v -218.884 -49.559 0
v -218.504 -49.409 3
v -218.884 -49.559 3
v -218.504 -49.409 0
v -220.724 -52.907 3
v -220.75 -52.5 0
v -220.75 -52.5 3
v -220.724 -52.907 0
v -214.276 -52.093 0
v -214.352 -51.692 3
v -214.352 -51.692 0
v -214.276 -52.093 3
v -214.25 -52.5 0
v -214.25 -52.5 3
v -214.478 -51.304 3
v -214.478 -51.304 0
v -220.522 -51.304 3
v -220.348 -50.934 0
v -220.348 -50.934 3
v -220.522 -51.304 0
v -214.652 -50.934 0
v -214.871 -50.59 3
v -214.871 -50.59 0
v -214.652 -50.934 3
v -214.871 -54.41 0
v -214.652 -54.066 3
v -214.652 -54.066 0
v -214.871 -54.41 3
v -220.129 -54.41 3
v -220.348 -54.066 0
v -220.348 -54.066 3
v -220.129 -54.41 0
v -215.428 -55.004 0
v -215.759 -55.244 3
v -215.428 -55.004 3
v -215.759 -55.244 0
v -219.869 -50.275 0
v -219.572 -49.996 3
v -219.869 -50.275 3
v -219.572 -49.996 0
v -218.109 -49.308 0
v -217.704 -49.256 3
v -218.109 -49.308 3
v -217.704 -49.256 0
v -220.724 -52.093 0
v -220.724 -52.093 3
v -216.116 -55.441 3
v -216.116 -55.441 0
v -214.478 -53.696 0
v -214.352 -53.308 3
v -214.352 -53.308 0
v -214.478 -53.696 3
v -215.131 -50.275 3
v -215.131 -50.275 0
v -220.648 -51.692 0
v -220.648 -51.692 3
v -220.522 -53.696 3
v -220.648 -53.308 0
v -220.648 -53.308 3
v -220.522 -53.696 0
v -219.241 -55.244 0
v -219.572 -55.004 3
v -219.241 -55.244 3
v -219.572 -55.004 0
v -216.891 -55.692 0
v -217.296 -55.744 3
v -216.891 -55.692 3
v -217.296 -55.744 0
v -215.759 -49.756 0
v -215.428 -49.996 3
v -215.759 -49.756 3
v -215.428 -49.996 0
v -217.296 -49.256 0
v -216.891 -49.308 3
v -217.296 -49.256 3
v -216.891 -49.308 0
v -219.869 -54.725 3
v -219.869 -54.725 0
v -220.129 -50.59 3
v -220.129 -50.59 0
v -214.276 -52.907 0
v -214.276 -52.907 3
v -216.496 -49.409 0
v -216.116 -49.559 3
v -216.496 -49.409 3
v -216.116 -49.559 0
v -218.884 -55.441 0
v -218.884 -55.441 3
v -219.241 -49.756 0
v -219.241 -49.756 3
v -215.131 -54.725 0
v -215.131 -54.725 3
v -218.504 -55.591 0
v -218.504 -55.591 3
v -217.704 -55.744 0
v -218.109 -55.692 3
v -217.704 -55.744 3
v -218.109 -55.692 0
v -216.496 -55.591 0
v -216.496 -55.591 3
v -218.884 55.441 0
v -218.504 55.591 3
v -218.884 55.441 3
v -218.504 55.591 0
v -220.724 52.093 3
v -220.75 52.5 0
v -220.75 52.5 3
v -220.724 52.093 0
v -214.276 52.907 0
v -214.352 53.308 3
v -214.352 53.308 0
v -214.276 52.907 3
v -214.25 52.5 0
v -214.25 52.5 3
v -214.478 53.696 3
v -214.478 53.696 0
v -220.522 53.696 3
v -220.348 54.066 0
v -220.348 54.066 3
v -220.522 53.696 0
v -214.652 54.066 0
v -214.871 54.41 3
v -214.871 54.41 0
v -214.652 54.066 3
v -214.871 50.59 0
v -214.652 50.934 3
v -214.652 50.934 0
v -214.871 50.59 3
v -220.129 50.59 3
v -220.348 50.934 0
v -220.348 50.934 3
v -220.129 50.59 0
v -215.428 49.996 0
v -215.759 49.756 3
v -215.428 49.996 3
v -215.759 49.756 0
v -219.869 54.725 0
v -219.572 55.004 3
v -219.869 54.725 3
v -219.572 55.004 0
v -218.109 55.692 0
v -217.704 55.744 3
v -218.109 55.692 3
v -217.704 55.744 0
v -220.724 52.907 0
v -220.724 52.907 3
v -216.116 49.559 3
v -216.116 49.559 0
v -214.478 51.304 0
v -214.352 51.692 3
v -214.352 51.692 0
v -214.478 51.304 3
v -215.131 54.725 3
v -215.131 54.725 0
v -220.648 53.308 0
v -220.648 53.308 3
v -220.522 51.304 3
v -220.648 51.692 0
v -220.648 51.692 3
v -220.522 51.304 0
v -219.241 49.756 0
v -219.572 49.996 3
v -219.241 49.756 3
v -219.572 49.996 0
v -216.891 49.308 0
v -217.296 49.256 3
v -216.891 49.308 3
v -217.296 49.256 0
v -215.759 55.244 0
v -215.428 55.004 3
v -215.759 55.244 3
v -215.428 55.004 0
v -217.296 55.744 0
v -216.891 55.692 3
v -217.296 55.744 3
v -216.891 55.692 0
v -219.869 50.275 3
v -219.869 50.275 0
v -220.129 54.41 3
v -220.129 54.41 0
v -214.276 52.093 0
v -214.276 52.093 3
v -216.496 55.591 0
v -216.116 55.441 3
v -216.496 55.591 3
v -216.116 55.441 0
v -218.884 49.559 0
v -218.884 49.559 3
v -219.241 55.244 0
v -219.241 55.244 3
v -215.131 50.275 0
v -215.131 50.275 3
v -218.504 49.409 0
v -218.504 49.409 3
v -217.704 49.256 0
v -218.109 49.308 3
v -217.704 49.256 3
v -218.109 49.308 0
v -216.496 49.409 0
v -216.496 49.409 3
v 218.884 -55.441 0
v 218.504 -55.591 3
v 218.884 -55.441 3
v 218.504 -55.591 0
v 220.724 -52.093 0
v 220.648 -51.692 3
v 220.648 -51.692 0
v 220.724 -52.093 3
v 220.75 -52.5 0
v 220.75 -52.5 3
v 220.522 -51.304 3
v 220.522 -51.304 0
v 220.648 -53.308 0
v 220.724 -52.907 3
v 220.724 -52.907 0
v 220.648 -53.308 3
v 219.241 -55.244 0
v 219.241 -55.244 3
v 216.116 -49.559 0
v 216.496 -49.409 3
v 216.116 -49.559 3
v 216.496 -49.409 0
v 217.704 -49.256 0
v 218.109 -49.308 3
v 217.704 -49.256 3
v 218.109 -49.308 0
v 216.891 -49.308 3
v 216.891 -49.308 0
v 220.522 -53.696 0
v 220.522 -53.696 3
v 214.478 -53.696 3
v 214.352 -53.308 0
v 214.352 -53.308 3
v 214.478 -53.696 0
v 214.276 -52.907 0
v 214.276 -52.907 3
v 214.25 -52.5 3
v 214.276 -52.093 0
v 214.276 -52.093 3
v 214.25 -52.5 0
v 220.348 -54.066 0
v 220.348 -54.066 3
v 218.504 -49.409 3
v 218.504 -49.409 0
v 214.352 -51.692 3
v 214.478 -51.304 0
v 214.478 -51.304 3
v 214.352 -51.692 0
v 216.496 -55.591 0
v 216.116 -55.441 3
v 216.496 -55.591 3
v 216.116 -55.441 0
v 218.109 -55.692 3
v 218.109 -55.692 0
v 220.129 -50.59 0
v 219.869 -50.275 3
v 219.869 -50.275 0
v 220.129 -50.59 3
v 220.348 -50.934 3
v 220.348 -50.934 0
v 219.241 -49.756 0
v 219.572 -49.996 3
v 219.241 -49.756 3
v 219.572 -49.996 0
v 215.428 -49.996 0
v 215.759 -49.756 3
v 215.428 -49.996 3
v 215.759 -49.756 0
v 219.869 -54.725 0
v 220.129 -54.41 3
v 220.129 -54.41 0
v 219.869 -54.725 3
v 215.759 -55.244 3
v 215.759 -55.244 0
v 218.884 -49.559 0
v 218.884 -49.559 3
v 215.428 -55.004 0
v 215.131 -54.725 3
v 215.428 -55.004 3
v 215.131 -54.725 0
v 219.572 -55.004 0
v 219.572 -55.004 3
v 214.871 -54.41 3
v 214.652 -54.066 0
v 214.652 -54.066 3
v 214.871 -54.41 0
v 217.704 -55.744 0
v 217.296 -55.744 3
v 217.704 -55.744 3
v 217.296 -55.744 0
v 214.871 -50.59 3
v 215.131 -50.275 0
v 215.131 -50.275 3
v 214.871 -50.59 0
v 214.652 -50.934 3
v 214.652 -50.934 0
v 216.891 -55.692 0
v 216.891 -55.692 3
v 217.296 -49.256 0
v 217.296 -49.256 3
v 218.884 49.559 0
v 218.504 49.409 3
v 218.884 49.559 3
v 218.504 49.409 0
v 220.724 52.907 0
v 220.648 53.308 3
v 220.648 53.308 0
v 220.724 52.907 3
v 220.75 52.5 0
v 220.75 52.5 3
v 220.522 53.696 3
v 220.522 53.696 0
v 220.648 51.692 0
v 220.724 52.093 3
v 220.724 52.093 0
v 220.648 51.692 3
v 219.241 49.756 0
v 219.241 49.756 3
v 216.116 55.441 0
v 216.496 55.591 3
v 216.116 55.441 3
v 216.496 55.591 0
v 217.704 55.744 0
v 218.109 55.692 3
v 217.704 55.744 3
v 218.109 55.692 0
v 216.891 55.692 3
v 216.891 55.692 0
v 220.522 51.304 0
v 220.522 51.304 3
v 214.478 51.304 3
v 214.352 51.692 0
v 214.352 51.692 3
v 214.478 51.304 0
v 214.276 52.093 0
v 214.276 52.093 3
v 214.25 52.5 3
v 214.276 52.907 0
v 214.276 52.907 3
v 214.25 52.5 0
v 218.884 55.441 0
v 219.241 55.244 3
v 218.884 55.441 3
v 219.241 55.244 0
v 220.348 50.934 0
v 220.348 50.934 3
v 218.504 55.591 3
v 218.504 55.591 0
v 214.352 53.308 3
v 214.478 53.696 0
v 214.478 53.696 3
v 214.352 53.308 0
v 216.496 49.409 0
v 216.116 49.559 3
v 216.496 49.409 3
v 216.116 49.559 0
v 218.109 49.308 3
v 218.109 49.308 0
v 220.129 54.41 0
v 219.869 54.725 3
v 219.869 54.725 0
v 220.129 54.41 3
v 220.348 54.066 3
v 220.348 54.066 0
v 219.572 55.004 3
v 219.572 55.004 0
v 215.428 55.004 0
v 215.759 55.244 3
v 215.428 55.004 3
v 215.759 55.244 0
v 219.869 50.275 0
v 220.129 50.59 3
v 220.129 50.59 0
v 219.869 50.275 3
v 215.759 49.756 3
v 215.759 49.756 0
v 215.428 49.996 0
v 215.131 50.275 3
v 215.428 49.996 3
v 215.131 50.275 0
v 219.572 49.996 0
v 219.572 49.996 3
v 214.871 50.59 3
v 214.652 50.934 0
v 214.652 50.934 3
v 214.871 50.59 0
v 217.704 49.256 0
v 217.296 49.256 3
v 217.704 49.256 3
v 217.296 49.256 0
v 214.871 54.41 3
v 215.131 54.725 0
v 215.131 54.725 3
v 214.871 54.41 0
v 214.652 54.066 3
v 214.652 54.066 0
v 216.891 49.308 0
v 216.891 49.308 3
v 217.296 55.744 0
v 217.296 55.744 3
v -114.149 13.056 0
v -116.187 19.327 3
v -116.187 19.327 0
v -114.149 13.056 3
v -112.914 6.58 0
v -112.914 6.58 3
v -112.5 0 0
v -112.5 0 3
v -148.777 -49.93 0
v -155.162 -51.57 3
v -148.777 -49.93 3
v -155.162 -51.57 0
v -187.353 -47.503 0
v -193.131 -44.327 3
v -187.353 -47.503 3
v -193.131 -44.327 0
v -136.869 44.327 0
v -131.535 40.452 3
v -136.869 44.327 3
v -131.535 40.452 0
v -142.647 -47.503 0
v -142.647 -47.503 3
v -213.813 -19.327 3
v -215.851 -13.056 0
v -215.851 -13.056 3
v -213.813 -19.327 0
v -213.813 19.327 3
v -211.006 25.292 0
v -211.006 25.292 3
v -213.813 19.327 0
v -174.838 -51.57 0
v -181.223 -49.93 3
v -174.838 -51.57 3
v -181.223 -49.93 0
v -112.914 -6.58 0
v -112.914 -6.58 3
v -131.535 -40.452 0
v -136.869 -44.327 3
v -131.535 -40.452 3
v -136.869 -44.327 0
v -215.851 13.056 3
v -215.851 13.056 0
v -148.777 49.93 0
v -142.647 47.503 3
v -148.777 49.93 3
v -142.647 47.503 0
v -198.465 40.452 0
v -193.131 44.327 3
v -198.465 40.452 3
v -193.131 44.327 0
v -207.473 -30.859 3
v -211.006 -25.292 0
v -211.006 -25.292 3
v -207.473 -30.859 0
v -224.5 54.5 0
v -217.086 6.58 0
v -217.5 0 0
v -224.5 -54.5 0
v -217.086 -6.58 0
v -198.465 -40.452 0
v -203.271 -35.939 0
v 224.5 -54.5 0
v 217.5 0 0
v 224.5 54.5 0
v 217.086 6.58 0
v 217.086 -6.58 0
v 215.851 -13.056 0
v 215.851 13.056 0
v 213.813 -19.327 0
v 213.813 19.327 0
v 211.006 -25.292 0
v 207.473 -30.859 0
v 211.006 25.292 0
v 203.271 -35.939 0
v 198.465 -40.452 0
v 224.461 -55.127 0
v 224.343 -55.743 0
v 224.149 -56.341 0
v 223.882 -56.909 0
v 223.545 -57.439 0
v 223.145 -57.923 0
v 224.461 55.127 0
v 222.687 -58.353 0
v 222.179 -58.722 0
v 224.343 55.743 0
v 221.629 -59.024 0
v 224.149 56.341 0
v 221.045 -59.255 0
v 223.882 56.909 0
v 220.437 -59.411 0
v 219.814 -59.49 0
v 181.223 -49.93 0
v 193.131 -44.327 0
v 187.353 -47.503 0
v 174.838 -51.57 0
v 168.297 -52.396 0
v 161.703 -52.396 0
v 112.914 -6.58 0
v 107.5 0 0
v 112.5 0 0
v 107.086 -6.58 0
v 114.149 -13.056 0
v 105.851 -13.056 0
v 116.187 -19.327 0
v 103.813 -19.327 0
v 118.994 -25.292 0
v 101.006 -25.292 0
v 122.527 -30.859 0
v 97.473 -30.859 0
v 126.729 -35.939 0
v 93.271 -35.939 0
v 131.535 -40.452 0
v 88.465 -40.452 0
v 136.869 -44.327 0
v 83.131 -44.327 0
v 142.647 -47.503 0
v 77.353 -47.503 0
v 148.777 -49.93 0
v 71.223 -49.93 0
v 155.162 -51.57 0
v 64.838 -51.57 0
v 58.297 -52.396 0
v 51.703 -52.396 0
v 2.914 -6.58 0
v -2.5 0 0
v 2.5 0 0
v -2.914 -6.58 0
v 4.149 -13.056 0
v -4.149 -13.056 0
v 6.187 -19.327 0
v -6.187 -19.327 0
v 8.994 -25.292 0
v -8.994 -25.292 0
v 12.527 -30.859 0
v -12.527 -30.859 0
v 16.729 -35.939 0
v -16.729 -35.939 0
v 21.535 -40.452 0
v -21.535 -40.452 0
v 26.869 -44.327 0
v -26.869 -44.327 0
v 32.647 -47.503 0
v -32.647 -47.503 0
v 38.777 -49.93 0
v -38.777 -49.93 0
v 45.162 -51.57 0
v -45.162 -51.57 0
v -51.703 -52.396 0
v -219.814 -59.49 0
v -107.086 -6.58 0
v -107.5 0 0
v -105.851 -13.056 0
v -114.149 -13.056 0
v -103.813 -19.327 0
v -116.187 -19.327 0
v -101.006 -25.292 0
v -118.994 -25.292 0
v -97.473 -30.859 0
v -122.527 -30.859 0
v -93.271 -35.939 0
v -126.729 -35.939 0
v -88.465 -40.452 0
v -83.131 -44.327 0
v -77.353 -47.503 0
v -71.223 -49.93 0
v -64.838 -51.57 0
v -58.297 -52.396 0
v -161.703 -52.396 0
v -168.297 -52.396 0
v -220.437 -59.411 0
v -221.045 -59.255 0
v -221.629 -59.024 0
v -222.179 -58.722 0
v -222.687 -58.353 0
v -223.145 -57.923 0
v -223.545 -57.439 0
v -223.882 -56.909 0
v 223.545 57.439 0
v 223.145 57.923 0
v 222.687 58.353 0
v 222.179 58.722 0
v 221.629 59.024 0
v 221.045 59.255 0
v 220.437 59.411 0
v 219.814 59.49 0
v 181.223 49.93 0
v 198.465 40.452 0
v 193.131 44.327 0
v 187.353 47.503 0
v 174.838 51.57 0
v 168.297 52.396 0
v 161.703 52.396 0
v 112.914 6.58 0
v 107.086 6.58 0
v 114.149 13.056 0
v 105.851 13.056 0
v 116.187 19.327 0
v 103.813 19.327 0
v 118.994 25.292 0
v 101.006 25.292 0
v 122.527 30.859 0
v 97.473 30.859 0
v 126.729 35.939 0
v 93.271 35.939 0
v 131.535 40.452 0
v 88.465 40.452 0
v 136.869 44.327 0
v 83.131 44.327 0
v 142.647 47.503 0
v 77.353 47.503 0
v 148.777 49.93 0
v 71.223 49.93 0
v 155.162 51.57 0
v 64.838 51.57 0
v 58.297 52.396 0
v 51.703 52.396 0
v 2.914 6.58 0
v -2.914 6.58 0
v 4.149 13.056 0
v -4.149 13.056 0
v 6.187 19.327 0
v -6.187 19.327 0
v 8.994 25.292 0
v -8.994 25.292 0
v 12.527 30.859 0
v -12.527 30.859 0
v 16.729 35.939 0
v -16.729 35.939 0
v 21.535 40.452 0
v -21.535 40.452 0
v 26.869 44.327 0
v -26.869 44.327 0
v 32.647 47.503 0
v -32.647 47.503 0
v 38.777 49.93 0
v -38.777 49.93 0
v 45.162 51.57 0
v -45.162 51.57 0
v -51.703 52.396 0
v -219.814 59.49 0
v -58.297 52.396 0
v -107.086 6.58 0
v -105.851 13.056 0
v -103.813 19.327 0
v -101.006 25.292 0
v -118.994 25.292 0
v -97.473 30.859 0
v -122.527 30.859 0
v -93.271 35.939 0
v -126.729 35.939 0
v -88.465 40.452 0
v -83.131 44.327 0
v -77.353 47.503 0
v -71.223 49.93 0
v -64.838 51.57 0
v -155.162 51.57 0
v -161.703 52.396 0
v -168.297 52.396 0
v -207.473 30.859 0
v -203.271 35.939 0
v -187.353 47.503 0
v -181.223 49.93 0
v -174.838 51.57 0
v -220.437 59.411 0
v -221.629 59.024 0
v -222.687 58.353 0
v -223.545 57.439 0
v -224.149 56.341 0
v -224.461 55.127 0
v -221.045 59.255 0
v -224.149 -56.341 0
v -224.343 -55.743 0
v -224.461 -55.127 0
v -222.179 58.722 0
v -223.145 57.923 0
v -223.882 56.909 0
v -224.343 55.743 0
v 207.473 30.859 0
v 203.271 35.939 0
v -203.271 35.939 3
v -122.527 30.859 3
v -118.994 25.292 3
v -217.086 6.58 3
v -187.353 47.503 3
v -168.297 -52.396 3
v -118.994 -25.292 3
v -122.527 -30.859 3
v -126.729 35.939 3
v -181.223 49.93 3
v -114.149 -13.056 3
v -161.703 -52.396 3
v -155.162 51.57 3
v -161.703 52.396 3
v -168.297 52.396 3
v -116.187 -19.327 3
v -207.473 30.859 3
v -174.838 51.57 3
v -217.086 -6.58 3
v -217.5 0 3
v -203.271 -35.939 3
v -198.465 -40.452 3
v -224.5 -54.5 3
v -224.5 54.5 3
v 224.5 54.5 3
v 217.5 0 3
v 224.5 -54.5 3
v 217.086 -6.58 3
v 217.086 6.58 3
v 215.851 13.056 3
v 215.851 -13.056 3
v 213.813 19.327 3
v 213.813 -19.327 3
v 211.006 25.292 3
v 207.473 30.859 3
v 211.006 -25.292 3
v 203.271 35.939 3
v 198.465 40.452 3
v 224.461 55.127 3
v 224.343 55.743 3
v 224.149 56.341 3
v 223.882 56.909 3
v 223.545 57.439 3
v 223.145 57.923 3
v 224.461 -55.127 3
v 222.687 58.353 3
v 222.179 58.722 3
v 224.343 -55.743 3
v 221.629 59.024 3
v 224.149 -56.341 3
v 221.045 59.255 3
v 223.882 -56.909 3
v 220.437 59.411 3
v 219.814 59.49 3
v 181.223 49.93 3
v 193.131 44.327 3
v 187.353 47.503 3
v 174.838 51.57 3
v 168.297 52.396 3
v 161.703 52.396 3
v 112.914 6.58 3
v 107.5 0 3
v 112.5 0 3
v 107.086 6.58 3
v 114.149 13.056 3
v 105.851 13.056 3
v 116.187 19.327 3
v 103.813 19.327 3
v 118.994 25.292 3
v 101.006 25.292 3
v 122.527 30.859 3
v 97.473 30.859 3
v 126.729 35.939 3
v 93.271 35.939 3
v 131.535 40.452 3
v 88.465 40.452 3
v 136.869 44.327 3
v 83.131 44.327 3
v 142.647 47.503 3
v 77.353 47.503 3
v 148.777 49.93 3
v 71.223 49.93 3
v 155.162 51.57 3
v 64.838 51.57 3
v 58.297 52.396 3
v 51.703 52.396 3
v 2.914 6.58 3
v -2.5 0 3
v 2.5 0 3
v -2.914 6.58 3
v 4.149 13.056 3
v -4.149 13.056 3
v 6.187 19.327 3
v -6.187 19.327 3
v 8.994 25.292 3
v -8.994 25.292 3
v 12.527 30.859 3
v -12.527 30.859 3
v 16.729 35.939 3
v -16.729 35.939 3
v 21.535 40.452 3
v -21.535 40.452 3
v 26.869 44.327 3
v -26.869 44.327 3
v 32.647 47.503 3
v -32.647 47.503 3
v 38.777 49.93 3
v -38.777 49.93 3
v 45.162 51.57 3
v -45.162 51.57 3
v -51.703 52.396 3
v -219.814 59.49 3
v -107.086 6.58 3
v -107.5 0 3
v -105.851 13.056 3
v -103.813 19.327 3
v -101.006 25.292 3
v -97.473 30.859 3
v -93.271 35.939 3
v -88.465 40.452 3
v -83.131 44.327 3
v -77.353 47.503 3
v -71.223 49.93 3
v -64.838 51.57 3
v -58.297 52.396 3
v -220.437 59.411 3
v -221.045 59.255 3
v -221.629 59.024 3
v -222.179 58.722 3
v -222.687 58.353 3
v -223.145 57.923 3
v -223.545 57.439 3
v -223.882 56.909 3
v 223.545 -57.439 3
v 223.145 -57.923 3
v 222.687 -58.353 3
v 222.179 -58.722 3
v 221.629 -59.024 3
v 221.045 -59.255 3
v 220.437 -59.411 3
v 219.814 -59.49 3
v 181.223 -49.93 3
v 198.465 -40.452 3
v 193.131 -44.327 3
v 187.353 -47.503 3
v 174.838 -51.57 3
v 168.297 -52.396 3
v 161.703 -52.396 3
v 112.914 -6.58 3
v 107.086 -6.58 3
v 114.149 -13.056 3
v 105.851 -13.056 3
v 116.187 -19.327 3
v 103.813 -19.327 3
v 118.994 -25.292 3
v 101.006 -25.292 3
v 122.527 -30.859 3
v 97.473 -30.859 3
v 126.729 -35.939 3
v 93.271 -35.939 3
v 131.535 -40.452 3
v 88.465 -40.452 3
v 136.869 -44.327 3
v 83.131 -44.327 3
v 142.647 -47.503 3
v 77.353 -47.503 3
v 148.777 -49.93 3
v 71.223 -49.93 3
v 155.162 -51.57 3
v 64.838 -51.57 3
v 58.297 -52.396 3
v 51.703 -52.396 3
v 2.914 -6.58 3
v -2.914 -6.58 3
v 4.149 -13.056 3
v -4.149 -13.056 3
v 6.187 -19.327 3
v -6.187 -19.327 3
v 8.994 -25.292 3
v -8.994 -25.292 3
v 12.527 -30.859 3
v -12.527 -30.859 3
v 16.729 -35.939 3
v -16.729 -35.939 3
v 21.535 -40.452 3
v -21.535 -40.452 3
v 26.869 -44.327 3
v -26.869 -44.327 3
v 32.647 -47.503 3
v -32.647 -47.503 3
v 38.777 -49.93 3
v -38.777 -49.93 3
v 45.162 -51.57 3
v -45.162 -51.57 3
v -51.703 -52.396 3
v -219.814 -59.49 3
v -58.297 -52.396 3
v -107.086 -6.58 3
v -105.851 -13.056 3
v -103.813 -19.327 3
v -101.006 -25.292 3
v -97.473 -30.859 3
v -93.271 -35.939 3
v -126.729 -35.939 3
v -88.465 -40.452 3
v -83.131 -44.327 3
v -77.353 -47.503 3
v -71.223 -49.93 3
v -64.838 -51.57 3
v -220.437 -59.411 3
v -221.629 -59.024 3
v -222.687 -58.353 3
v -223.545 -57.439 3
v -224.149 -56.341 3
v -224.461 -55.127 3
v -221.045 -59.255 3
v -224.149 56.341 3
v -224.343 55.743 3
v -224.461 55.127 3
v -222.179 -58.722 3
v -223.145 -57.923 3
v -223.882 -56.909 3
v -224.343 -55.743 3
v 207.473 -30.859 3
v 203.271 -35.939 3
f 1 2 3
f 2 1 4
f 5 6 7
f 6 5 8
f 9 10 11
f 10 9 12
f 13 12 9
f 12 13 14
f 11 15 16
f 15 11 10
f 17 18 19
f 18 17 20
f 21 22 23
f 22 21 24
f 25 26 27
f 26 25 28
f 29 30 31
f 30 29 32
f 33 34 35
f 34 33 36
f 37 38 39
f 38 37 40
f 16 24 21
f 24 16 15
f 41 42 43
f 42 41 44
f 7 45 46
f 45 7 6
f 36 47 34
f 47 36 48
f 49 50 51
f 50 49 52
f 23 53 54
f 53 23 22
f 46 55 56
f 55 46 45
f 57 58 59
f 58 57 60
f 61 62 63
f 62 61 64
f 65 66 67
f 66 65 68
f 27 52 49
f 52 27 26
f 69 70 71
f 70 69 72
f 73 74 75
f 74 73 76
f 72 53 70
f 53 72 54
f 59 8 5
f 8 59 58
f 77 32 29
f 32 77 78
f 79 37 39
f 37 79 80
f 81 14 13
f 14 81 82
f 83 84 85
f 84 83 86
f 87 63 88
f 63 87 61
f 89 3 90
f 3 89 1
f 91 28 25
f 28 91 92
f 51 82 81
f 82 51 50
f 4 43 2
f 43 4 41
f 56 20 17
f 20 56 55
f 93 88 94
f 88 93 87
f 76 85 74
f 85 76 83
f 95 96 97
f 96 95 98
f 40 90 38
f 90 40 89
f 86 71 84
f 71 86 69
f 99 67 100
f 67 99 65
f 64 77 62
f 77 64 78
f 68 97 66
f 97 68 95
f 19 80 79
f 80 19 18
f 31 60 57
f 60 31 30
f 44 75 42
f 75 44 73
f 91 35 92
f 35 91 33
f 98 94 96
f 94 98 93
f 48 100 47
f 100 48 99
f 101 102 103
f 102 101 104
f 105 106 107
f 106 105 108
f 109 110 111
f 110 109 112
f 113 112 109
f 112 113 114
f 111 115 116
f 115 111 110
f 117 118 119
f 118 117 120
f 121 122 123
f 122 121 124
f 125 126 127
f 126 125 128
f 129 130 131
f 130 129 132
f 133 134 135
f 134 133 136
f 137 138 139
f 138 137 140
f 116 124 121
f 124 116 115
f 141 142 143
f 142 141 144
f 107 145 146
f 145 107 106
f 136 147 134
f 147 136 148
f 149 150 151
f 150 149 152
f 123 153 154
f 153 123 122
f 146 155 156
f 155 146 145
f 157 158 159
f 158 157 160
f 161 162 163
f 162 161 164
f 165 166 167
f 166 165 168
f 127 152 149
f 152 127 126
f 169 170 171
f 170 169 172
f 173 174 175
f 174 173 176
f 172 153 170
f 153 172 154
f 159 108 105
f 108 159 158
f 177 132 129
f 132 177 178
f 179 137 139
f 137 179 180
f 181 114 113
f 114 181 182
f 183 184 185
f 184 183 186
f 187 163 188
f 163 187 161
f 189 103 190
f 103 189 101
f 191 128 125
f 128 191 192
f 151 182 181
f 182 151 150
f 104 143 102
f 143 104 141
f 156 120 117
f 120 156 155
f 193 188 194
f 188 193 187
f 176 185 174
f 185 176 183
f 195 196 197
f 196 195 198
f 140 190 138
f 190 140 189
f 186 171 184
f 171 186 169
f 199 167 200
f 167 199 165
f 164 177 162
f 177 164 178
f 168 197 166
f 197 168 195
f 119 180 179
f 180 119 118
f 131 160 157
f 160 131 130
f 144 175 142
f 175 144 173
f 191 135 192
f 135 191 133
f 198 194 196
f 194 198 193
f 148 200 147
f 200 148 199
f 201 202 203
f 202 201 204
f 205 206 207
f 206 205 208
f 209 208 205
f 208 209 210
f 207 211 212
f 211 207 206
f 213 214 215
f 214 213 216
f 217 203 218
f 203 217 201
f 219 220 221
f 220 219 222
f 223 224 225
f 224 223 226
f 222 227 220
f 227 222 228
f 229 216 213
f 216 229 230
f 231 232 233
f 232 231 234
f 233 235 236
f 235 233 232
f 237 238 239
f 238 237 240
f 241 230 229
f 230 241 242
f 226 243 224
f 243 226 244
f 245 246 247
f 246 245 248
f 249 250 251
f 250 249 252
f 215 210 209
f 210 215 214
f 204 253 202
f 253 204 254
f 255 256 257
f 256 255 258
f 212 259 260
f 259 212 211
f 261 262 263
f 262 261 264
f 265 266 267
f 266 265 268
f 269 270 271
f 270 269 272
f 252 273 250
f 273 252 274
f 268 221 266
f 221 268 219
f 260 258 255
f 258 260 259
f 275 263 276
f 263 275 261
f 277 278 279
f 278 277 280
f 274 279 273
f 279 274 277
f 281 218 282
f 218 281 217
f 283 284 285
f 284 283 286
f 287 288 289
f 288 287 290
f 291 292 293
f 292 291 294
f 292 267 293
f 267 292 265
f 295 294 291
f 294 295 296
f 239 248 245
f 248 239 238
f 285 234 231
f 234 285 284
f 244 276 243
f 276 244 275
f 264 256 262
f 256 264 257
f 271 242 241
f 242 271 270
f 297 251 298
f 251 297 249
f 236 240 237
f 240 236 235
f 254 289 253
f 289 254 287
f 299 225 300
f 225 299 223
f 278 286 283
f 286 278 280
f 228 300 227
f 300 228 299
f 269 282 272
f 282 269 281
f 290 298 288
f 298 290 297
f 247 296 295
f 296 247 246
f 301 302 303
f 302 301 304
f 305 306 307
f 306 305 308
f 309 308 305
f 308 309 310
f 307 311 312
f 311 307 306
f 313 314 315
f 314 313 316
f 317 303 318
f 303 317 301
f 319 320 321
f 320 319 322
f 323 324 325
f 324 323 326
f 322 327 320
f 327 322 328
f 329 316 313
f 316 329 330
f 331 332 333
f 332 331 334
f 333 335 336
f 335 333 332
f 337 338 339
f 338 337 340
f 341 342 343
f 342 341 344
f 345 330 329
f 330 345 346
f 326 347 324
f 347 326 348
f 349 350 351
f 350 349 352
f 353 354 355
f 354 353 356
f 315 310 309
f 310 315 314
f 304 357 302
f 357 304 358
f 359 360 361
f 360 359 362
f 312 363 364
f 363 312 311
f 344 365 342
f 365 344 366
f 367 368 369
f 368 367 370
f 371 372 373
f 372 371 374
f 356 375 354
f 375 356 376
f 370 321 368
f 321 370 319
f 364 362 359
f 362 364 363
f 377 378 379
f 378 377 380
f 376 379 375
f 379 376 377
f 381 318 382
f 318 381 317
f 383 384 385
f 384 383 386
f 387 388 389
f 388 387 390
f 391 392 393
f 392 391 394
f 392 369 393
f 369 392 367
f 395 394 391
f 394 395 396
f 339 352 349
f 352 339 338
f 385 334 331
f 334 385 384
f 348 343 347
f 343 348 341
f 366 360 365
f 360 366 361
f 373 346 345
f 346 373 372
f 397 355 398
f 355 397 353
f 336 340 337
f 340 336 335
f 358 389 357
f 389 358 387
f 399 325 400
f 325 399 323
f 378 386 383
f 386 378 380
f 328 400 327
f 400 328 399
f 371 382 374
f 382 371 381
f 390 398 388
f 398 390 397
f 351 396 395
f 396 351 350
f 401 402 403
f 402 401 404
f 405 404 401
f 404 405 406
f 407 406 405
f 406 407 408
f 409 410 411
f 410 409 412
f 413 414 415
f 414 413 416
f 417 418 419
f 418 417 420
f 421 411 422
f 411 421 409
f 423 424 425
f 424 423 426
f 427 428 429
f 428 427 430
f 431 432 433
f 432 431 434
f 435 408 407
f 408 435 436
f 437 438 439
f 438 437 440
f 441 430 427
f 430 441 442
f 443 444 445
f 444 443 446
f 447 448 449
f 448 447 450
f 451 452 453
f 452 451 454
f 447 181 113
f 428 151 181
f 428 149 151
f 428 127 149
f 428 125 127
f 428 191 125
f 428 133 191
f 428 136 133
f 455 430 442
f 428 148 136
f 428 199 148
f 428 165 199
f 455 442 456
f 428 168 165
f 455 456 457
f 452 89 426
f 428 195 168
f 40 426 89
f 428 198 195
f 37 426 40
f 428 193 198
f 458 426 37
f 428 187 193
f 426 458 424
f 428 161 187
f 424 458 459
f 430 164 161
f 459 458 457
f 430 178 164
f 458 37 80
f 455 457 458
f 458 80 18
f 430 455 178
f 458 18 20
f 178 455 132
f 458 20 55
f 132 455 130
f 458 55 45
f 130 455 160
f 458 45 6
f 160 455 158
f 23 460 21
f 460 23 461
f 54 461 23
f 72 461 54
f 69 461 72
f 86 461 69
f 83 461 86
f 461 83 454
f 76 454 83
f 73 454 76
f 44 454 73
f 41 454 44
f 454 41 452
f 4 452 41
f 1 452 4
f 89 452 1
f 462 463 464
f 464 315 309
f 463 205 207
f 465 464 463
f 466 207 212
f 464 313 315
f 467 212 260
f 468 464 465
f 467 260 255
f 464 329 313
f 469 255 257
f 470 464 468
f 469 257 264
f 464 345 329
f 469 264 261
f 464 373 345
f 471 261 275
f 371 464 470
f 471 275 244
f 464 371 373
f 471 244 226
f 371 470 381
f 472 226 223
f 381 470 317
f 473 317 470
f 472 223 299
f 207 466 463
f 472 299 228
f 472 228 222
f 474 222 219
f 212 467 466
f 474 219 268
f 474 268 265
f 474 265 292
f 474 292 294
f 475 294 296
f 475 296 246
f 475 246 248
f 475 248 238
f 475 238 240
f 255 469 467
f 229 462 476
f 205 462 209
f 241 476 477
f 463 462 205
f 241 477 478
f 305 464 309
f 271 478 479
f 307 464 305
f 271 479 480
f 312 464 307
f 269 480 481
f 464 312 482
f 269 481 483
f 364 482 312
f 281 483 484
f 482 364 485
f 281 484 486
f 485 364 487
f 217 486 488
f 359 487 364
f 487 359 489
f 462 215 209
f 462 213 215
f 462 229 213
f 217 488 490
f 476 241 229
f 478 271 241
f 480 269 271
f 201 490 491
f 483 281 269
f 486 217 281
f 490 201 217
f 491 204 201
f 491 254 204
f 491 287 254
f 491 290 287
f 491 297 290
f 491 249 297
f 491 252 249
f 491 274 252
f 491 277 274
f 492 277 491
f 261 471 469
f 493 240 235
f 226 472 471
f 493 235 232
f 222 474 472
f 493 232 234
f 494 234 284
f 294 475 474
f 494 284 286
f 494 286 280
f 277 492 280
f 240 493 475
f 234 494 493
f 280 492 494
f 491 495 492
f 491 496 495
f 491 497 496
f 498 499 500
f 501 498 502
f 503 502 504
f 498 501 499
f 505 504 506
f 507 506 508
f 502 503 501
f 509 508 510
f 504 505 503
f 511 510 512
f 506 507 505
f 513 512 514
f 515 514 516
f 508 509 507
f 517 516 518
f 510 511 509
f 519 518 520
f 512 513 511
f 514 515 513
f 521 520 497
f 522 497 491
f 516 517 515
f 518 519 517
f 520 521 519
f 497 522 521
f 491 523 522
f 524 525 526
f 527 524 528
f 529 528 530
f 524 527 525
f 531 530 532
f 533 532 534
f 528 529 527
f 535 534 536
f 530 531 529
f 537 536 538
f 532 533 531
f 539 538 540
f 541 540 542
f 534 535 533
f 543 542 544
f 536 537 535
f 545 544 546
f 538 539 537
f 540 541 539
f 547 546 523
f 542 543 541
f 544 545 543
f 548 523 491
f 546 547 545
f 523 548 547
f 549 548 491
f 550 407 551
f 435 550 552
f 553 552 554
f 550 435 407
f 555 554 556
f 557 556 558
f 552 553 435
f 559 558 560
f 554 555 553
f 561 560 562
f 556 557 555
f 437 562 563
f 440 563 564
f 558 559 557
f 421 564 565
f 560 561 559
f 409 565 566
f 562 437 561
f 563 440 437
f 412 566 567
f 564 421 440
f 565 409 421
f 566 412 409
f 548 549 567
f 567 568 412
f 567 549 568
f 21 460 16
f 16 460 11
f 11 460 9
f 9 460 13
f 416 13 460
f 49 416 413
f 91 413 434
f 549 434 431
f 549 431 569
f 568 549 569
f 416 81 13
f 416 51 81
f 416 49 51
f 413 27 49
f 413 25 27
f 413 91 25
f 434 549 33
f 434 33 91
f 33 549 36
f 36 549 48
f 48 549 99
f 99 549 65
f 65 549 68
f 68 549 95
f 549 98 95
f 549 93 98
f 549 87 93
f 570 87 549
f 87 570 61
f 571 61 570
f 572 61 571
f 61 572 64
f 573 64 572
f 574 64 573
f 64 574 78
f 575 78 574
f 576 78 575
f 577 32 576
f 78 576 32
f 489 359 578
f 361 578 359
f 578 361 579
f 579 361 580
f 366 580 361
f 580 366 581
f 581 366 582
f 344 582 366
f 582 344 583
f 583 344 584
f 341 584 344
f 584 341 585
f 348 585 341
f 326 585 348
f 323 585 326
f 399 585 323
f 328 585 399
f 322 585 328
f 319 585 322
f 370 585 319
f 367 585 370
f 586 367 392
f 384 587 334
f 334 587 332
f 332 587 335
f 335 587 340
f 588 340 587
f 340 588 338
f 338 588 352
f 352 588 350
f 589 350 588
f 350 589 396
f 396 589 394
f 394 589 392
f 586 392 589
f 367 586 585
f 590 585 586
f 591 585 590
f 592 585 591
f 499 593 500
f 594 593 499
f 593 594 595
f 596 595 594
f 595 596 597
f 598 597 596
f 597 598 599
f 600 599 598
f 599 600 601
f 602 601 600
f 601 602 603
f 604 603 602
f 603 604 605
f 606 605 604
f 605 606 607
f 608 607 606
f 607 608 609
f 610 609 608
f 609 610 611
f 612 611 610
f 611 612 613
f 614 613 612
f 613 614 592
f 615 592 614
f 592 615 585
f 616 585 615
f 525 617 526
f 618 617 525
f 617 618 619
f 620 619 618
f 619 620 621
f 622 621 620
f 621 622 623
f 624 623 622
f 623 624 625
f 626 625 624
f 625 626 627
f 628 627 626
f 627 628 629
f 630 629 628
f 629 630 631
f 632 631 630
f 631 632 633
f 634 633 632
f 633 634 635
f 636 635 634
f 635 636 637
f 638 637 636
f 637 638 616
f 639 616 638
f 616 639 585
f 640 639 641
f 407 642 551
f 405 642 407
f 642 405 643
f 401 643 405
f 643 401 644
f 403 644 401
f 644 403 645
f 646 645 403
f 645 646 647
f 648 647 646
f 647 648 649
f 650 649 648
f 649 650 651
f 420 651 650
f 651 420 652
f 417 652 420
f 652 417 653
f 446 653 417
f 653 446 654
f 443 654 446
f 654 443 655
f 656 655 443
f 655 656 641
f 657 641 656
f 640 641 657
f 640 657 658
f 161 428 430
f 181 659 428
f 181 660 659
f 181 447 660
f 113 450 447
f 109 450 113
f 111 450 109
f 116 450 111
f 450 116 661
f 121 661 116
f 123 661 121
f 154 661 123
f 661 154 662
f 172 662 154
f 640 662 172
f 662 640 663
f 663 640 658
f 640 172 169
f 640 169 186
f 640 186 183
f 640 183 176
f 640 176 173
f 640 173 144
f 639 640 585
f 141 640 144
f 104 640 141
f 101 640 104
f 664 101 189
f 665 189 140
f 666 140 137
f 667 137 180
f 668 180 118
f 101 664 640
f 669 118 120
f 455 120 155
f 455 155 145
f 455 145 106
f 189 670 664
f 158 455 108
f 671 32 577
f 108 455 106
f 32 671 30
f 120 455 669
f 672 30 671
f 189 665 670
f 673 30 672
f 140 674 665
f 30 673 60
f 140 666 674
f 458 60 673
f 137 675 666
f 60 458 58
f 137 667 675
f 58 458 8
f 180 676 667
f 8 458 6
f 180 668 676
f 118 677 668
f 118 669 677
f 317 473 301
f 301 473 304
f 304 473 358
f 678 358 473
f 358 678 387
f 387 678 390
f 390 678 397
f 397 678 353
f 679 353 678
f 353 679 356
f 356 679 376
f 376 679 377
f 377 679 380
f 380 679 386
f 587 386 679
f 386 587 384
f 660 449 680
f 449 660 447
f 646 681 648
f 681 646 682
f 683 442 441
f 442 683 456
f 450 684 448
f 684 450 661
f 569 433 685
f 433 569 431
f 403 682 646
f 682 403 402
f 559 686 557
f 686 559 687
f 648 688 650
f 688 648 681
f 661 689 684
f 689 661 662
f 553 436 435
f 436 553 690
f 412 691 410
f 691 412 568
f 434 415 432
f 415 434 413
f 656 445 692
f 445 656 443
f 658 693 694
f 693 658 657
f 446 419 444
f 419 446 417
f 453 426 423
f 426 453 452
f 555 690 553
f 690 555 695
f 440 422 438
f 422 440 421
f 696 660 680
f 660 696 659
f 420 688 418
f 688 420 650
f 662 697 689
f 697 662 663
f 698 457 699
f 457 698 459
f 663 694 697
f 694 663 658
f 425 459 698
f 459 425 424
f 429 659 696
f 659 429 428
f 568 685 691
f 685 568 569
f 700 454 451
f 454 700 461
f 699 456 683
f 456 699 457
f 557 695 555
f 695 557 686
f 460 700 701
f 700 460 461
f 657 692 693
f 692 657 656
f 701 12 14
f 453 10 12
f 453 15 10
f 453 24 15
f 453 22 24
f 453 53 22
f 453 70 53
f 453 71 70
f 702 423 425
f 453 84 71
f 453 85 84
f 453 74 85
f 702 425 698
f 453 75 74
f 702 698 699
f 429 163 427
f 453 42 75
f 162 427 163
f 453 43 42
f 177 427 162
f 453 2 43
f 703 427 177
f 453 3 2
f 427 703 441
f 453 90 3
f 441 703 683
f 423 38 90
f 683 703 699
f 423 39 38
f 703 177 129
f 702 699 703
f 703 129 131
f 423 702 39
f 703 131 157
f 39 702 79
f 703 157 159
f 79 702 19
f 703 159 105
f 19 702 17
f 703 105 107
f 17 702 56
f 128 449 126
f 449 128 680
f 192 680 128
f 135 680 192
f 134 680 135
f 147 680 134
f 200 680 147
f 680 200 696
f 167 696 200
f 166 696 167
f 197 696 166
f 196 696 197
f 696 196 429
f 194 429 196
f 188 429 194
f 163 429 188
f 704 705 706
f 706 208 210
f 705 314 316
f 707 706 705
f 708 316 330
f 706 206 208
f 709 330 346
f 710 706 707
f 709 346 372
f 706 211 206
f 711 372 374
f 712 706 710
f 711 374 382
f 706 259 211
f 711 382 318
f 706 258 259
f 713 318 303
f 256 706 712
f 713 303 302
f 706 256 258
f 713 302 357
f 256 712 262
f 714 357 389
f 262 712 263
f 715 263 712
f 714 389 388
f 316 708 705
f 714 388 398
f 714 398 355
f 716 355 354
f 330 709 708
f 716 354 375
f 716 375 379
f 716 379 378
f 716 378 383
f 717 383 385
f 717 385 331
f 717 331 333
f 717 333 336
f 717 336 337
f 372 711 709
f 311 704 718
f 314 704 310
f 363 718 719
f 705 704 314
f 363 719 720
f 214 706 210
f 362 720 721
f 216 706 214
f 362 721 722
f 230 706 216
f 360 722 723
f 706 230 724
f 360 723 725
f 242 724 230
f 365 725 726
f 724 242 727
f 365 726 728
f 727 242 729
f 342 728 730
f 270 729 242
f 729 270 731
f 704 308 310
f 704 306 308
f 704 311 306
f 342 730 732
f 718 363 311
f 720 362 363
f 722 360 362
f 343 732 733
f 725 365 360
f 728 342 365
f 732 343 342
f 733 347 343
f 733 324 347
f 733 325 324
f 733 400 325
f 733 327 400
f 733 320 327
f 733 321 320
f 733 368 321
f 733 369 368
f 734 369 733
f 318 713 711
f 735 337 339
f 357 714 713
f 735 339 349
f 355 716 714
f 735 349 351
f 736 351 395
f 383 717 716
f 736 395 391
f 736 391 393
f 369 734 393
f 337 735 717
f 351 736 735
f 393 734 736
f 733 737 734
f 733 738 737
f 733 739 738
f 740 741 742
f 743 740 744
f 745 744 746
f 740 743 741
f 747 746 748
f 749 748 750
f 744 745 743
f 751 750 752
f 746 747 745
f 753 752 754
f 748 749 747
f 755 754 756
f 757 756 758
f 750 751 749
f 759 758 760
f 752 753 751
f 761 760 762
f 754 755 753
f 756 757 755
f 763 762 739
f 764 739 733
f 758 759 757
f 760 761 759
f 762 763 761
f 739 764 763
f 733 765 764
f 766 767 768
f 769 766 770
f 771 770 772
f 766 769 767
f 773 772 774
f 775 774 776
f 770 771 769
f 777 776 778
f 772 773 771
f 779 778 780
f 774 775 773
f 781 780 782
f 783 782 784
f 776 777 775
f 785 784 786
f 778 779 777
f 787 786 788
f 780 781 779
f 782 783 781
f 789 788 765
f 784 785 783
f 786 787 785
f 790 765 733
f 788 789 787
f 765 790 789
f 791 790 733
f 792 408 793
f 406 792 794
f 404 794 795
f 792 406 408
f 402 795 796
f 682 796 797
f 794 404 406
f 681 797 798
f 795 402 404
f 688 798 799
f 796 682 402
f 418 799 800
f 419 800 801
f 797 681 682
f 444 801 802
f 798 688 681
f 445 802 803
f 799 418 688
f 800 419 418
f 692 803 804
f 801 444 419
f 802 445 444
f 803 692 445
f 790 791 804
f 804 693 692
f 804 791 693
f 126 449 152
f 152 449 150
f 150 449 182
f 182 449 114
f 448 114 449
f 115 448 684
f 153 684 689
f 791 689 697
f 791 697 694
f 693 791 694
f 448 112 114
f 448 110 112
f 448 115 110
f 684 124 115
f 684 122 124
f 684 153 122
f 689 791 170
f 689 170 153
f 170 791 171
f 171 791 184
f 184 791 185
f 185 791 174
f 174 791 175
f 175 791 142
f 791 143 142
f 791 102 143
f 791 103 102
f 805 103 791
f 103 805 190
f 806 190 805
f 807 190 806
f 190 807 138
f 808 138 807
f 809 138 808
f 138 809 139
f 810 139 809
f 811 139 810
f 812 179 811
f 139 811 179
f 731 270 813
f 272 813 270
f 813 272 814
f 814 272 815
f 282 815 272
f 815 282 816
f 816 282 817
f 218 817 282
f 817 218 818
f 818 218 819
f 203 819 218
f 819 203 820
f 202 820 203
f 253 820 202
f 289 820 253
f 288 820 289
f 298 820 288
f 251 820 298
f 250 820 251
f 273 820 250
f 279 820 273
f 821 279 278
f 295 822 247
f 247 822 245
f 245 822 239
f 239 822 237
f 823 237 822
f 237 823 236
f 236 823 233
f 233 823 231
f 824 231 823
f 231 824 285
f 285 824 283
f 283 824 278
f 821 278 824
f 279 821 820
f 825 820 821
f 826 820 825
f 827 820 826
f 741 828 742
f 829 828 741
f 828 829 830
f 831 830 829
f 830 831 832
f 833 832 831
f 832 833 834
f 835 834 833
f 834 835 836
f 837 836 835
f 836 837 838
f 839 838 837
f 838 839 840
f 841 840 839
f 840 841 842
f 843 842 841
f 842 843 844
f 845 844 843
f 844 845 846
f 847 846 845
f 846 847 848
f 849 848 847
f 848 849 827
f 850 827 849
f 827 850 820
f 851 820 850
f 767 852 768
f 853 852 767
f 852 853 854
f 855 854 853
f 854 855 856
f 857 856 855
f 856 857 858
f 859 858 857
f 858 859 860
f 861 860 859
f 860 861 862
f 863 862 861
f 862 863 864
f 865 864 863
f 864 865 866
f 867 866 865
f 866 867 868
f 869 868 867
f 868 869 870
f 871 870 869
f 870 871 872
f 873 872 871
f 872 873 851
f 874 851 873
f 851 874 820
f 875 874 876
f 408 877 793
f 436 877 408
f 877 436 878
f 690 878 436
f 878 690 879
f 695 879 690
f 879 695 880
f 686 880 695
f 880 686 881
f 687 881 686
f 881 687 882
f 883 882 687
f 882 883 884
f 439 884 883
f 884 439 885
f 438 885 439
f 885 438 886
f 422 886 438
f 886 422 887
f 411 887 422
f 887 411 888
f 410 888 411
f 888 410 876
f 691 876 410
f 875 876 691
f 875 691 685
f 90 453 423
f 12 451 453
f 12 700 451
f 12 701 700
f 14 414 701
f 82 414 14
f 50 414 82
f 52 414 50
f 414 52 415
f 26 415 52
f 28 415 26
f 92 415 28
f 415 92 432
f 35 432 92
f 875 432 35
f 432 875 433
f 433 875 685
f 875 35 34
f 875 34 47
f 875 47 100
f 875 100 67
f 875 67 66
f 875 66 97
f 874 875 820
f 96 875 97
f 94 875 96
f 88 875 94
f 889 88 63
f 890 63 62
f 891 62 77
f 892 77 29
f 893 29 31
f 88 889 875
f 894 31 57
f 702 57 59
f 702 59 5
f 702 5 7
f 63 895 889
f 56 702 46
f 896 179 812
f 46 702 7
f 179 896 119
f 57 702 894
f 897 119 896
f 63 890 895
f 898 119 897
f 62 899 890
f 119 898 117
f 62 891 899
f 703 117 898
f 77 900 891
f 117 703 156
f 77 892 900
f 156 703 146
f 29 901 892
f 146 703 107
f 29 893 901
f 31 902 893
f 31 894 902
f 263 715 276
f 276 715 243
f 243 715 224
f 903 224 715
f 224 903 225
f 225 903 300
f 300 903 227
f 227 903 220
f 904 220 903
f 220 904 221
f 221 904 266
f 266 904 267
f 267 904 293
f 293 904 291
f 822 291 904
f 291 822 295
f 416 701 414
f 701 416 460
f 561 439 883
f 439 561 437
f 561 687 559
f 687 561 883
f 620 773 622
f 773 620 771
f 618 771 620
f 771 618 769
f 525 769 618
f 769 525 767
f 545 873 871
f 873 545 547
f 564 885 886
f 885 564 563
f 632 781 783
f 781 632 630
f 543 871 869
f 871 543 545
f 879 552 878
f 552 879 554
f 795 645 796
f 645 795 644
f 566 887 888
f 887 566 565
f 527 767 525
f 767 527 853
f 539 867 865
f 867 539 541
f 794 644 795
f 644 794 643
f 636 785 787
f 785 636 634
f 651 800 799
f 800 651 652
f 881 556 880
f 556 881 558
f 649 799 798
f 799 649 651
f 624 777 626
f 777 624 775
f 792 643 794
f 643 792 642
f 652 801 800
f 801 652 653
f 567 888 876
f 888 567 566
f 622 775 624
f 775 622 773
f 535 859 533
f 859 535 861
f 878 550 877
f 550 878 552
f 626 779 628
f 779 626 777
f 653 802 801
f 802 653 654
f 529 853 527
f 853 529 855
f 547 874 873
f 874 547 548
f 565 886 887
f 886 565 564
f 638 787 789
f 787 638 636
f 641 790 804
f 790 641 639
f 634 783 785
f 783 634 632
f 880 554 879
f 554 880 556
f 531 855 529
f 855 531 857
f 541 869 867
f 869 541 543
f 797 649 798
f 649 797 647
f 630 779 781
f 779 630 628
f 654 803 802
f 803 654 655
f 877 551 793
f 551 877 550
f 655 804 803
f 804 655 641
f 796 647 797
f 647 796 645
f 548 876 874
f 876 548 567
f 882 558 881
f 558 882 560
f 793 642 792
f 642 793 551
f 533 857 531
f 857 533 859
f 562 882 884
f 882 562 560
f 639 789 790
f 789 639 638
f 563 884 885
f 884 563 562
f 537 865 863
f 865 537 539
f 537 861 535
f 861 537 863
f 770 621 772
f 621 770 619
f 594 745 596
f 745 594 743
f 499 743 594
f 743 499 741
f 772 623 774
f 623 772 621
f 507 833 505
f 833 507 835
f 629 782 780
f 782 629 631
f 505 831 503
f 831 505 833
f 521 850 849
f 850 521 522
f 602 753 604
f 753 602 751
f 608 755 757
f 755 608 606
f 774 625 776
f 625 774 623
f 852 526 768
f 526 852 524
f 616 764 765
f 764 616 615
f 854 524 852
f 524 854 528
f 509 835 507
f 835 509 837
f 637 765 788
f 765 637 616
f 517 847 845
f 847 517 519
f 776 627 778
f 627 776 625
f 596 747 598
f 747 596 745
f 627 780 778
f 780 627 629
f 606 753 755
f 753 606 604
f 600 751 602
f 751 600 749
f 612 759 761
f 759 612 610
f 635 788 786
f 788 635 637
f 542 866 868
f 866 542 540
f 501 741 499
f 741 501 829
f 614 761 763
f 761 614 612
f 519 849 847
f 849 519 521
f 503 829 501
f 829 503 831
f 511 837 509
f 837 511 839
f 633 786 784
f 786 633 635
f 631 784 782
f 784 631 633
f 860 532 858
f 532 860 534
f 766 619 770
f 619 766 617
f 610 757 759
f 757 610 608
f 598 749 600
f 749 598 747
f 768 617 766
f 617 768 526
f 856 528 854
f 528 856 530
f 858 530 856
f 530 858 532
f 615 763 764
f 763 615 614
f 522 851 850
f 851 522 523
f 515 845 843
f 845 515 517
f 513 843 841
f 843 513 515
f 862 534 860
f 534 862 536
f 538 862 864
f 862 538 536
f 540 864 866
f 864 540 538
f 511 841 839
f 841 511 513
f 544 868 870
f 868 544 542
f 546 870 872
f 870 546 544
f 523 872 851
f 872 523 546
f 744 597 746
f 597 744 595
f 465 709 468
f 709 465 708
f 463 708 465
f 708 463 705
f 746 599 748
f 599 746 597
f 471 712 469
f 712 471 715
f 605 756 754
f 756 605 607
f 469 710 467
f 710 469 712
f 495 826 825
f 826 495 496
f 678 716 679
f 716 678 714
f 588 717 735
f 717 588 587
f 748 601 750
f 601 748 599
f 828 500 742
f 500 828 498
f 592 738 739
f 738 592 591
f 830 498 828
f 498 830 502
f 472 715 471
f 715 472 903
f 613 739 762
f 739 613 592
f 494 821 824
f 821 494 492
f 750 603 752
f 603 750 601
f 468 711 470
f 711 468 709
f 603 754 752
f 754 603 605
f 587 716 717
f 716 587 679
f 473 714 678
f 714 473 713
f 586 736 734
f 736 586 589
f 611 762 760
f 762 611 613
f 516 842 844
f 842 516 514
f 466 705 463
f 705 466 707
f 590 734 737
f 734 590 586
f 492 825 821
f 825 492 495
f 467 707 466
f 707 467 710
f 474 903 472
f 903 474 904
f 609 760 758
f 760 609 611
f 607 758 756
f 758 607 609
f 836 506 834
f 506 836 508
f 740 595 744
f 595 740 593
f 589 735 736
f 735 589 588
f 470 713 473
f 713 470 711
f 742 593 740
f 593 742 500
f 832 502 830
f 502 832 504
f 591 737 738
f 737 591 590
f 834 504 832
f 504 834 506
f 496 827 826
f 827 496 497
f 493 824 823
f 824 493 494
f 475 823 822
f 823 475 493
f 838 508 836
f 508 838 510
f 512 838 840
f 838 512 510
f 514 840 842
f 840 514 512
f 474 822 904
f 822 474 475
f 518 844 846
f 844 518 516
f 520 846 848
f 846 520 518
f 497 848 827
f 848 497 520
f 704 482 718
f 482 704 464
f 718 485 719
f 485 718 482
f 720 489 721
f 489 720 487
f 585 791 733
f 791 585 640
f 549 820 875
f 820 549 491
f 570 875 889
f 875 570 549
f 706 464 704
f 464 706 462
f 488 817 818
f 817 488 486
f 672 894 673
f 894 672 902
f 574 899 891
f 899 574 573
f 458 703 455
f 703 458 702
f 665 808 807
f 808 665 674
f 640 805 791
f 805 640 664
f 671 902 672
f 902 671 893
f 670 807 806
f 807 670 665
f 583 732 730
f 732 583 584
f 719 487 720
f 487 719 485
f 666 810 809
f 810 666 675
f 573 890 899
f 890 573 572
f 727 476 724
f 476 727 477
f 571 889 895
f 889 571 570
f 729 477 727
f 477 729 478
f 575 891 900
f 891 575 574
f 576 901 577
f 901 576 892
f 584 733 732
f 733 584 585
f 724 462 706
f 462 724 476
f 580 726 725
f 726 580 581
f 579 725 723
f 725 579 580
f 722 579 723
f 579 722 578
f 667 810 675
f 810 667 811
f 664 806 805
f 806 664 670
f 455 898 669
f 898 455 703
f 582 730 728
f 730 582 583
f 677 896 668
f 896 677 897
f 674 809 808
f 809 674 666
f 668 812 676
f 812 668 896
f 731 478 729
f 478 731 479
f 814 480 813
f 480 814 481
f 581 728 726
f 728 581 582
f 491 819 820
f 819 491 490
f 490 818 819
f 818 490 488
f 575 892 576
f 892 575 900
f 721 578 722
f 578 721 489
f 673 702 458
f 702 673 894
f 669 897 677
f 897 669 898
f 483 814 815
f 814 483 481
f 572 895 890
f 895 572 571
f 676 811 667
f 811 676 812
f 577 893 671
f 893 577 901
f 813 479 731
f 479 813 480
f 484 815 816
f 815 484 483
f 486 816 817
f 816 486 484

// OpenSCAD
$fn = 50;


difference() {
	union() {
		hull() {
			translate(v = [-219.5000000000, 54.5000000000, 0]) {
				cylinder(h = 3, r = 5);
			}
			translate(v = [219.5000000000, 54.5000000000, 0]) {
				cylinder(h = 3, r = 5);
			}
			translate(v = [-219.5000000000, -54.5000000000, 0]) {
				cylinder(h = 3, r = 5);
			}
			translate(v = [219.5000000000, -54.5000000000, 0]) {
				cylinder(h = 3, r = 5);
			}
		}
	}
	union() {
		#translate(v = [-217.5000000000, -52.5000000000, -100.0000000000]) {
			cylinder(h = 200, r = 3.2500000000);
		}
		#translate(v = [-217.5000000000, 52.5000000000, -100.0000000000]) {
			cylinder(h = 200, r = 3.2500000000);
		}
		#translate(v = [217.5000000000, -52.5000000000, -100.0000000000]) {
			cylinder(h = 200, r = 3.2500000000);
		}
		#translate(v = [217.5000000000, 52.5000000000, -100.0000000000]) {
			cylinder(h = 200, r = 3.2500000000);
		}
		#translate(v = [-165.0000000000, 0, 0]) {
			cylinder(h = 3, r = 52.5000000000);
		}
		#translate(v = [-55.0000000000, 0, 0]) {
			cylinder(h = 3, r = 52.5000000000);
		}
		#translate(v = [55.0000000000, 0, 0]) {
			cylinder(h = 3, r = 52.5000000000);
		}
		#translate(v = [165.0000000000, 0, 0]) {
			cylinder(h = 3, r = 52.5000000000);
		}
	}
}
